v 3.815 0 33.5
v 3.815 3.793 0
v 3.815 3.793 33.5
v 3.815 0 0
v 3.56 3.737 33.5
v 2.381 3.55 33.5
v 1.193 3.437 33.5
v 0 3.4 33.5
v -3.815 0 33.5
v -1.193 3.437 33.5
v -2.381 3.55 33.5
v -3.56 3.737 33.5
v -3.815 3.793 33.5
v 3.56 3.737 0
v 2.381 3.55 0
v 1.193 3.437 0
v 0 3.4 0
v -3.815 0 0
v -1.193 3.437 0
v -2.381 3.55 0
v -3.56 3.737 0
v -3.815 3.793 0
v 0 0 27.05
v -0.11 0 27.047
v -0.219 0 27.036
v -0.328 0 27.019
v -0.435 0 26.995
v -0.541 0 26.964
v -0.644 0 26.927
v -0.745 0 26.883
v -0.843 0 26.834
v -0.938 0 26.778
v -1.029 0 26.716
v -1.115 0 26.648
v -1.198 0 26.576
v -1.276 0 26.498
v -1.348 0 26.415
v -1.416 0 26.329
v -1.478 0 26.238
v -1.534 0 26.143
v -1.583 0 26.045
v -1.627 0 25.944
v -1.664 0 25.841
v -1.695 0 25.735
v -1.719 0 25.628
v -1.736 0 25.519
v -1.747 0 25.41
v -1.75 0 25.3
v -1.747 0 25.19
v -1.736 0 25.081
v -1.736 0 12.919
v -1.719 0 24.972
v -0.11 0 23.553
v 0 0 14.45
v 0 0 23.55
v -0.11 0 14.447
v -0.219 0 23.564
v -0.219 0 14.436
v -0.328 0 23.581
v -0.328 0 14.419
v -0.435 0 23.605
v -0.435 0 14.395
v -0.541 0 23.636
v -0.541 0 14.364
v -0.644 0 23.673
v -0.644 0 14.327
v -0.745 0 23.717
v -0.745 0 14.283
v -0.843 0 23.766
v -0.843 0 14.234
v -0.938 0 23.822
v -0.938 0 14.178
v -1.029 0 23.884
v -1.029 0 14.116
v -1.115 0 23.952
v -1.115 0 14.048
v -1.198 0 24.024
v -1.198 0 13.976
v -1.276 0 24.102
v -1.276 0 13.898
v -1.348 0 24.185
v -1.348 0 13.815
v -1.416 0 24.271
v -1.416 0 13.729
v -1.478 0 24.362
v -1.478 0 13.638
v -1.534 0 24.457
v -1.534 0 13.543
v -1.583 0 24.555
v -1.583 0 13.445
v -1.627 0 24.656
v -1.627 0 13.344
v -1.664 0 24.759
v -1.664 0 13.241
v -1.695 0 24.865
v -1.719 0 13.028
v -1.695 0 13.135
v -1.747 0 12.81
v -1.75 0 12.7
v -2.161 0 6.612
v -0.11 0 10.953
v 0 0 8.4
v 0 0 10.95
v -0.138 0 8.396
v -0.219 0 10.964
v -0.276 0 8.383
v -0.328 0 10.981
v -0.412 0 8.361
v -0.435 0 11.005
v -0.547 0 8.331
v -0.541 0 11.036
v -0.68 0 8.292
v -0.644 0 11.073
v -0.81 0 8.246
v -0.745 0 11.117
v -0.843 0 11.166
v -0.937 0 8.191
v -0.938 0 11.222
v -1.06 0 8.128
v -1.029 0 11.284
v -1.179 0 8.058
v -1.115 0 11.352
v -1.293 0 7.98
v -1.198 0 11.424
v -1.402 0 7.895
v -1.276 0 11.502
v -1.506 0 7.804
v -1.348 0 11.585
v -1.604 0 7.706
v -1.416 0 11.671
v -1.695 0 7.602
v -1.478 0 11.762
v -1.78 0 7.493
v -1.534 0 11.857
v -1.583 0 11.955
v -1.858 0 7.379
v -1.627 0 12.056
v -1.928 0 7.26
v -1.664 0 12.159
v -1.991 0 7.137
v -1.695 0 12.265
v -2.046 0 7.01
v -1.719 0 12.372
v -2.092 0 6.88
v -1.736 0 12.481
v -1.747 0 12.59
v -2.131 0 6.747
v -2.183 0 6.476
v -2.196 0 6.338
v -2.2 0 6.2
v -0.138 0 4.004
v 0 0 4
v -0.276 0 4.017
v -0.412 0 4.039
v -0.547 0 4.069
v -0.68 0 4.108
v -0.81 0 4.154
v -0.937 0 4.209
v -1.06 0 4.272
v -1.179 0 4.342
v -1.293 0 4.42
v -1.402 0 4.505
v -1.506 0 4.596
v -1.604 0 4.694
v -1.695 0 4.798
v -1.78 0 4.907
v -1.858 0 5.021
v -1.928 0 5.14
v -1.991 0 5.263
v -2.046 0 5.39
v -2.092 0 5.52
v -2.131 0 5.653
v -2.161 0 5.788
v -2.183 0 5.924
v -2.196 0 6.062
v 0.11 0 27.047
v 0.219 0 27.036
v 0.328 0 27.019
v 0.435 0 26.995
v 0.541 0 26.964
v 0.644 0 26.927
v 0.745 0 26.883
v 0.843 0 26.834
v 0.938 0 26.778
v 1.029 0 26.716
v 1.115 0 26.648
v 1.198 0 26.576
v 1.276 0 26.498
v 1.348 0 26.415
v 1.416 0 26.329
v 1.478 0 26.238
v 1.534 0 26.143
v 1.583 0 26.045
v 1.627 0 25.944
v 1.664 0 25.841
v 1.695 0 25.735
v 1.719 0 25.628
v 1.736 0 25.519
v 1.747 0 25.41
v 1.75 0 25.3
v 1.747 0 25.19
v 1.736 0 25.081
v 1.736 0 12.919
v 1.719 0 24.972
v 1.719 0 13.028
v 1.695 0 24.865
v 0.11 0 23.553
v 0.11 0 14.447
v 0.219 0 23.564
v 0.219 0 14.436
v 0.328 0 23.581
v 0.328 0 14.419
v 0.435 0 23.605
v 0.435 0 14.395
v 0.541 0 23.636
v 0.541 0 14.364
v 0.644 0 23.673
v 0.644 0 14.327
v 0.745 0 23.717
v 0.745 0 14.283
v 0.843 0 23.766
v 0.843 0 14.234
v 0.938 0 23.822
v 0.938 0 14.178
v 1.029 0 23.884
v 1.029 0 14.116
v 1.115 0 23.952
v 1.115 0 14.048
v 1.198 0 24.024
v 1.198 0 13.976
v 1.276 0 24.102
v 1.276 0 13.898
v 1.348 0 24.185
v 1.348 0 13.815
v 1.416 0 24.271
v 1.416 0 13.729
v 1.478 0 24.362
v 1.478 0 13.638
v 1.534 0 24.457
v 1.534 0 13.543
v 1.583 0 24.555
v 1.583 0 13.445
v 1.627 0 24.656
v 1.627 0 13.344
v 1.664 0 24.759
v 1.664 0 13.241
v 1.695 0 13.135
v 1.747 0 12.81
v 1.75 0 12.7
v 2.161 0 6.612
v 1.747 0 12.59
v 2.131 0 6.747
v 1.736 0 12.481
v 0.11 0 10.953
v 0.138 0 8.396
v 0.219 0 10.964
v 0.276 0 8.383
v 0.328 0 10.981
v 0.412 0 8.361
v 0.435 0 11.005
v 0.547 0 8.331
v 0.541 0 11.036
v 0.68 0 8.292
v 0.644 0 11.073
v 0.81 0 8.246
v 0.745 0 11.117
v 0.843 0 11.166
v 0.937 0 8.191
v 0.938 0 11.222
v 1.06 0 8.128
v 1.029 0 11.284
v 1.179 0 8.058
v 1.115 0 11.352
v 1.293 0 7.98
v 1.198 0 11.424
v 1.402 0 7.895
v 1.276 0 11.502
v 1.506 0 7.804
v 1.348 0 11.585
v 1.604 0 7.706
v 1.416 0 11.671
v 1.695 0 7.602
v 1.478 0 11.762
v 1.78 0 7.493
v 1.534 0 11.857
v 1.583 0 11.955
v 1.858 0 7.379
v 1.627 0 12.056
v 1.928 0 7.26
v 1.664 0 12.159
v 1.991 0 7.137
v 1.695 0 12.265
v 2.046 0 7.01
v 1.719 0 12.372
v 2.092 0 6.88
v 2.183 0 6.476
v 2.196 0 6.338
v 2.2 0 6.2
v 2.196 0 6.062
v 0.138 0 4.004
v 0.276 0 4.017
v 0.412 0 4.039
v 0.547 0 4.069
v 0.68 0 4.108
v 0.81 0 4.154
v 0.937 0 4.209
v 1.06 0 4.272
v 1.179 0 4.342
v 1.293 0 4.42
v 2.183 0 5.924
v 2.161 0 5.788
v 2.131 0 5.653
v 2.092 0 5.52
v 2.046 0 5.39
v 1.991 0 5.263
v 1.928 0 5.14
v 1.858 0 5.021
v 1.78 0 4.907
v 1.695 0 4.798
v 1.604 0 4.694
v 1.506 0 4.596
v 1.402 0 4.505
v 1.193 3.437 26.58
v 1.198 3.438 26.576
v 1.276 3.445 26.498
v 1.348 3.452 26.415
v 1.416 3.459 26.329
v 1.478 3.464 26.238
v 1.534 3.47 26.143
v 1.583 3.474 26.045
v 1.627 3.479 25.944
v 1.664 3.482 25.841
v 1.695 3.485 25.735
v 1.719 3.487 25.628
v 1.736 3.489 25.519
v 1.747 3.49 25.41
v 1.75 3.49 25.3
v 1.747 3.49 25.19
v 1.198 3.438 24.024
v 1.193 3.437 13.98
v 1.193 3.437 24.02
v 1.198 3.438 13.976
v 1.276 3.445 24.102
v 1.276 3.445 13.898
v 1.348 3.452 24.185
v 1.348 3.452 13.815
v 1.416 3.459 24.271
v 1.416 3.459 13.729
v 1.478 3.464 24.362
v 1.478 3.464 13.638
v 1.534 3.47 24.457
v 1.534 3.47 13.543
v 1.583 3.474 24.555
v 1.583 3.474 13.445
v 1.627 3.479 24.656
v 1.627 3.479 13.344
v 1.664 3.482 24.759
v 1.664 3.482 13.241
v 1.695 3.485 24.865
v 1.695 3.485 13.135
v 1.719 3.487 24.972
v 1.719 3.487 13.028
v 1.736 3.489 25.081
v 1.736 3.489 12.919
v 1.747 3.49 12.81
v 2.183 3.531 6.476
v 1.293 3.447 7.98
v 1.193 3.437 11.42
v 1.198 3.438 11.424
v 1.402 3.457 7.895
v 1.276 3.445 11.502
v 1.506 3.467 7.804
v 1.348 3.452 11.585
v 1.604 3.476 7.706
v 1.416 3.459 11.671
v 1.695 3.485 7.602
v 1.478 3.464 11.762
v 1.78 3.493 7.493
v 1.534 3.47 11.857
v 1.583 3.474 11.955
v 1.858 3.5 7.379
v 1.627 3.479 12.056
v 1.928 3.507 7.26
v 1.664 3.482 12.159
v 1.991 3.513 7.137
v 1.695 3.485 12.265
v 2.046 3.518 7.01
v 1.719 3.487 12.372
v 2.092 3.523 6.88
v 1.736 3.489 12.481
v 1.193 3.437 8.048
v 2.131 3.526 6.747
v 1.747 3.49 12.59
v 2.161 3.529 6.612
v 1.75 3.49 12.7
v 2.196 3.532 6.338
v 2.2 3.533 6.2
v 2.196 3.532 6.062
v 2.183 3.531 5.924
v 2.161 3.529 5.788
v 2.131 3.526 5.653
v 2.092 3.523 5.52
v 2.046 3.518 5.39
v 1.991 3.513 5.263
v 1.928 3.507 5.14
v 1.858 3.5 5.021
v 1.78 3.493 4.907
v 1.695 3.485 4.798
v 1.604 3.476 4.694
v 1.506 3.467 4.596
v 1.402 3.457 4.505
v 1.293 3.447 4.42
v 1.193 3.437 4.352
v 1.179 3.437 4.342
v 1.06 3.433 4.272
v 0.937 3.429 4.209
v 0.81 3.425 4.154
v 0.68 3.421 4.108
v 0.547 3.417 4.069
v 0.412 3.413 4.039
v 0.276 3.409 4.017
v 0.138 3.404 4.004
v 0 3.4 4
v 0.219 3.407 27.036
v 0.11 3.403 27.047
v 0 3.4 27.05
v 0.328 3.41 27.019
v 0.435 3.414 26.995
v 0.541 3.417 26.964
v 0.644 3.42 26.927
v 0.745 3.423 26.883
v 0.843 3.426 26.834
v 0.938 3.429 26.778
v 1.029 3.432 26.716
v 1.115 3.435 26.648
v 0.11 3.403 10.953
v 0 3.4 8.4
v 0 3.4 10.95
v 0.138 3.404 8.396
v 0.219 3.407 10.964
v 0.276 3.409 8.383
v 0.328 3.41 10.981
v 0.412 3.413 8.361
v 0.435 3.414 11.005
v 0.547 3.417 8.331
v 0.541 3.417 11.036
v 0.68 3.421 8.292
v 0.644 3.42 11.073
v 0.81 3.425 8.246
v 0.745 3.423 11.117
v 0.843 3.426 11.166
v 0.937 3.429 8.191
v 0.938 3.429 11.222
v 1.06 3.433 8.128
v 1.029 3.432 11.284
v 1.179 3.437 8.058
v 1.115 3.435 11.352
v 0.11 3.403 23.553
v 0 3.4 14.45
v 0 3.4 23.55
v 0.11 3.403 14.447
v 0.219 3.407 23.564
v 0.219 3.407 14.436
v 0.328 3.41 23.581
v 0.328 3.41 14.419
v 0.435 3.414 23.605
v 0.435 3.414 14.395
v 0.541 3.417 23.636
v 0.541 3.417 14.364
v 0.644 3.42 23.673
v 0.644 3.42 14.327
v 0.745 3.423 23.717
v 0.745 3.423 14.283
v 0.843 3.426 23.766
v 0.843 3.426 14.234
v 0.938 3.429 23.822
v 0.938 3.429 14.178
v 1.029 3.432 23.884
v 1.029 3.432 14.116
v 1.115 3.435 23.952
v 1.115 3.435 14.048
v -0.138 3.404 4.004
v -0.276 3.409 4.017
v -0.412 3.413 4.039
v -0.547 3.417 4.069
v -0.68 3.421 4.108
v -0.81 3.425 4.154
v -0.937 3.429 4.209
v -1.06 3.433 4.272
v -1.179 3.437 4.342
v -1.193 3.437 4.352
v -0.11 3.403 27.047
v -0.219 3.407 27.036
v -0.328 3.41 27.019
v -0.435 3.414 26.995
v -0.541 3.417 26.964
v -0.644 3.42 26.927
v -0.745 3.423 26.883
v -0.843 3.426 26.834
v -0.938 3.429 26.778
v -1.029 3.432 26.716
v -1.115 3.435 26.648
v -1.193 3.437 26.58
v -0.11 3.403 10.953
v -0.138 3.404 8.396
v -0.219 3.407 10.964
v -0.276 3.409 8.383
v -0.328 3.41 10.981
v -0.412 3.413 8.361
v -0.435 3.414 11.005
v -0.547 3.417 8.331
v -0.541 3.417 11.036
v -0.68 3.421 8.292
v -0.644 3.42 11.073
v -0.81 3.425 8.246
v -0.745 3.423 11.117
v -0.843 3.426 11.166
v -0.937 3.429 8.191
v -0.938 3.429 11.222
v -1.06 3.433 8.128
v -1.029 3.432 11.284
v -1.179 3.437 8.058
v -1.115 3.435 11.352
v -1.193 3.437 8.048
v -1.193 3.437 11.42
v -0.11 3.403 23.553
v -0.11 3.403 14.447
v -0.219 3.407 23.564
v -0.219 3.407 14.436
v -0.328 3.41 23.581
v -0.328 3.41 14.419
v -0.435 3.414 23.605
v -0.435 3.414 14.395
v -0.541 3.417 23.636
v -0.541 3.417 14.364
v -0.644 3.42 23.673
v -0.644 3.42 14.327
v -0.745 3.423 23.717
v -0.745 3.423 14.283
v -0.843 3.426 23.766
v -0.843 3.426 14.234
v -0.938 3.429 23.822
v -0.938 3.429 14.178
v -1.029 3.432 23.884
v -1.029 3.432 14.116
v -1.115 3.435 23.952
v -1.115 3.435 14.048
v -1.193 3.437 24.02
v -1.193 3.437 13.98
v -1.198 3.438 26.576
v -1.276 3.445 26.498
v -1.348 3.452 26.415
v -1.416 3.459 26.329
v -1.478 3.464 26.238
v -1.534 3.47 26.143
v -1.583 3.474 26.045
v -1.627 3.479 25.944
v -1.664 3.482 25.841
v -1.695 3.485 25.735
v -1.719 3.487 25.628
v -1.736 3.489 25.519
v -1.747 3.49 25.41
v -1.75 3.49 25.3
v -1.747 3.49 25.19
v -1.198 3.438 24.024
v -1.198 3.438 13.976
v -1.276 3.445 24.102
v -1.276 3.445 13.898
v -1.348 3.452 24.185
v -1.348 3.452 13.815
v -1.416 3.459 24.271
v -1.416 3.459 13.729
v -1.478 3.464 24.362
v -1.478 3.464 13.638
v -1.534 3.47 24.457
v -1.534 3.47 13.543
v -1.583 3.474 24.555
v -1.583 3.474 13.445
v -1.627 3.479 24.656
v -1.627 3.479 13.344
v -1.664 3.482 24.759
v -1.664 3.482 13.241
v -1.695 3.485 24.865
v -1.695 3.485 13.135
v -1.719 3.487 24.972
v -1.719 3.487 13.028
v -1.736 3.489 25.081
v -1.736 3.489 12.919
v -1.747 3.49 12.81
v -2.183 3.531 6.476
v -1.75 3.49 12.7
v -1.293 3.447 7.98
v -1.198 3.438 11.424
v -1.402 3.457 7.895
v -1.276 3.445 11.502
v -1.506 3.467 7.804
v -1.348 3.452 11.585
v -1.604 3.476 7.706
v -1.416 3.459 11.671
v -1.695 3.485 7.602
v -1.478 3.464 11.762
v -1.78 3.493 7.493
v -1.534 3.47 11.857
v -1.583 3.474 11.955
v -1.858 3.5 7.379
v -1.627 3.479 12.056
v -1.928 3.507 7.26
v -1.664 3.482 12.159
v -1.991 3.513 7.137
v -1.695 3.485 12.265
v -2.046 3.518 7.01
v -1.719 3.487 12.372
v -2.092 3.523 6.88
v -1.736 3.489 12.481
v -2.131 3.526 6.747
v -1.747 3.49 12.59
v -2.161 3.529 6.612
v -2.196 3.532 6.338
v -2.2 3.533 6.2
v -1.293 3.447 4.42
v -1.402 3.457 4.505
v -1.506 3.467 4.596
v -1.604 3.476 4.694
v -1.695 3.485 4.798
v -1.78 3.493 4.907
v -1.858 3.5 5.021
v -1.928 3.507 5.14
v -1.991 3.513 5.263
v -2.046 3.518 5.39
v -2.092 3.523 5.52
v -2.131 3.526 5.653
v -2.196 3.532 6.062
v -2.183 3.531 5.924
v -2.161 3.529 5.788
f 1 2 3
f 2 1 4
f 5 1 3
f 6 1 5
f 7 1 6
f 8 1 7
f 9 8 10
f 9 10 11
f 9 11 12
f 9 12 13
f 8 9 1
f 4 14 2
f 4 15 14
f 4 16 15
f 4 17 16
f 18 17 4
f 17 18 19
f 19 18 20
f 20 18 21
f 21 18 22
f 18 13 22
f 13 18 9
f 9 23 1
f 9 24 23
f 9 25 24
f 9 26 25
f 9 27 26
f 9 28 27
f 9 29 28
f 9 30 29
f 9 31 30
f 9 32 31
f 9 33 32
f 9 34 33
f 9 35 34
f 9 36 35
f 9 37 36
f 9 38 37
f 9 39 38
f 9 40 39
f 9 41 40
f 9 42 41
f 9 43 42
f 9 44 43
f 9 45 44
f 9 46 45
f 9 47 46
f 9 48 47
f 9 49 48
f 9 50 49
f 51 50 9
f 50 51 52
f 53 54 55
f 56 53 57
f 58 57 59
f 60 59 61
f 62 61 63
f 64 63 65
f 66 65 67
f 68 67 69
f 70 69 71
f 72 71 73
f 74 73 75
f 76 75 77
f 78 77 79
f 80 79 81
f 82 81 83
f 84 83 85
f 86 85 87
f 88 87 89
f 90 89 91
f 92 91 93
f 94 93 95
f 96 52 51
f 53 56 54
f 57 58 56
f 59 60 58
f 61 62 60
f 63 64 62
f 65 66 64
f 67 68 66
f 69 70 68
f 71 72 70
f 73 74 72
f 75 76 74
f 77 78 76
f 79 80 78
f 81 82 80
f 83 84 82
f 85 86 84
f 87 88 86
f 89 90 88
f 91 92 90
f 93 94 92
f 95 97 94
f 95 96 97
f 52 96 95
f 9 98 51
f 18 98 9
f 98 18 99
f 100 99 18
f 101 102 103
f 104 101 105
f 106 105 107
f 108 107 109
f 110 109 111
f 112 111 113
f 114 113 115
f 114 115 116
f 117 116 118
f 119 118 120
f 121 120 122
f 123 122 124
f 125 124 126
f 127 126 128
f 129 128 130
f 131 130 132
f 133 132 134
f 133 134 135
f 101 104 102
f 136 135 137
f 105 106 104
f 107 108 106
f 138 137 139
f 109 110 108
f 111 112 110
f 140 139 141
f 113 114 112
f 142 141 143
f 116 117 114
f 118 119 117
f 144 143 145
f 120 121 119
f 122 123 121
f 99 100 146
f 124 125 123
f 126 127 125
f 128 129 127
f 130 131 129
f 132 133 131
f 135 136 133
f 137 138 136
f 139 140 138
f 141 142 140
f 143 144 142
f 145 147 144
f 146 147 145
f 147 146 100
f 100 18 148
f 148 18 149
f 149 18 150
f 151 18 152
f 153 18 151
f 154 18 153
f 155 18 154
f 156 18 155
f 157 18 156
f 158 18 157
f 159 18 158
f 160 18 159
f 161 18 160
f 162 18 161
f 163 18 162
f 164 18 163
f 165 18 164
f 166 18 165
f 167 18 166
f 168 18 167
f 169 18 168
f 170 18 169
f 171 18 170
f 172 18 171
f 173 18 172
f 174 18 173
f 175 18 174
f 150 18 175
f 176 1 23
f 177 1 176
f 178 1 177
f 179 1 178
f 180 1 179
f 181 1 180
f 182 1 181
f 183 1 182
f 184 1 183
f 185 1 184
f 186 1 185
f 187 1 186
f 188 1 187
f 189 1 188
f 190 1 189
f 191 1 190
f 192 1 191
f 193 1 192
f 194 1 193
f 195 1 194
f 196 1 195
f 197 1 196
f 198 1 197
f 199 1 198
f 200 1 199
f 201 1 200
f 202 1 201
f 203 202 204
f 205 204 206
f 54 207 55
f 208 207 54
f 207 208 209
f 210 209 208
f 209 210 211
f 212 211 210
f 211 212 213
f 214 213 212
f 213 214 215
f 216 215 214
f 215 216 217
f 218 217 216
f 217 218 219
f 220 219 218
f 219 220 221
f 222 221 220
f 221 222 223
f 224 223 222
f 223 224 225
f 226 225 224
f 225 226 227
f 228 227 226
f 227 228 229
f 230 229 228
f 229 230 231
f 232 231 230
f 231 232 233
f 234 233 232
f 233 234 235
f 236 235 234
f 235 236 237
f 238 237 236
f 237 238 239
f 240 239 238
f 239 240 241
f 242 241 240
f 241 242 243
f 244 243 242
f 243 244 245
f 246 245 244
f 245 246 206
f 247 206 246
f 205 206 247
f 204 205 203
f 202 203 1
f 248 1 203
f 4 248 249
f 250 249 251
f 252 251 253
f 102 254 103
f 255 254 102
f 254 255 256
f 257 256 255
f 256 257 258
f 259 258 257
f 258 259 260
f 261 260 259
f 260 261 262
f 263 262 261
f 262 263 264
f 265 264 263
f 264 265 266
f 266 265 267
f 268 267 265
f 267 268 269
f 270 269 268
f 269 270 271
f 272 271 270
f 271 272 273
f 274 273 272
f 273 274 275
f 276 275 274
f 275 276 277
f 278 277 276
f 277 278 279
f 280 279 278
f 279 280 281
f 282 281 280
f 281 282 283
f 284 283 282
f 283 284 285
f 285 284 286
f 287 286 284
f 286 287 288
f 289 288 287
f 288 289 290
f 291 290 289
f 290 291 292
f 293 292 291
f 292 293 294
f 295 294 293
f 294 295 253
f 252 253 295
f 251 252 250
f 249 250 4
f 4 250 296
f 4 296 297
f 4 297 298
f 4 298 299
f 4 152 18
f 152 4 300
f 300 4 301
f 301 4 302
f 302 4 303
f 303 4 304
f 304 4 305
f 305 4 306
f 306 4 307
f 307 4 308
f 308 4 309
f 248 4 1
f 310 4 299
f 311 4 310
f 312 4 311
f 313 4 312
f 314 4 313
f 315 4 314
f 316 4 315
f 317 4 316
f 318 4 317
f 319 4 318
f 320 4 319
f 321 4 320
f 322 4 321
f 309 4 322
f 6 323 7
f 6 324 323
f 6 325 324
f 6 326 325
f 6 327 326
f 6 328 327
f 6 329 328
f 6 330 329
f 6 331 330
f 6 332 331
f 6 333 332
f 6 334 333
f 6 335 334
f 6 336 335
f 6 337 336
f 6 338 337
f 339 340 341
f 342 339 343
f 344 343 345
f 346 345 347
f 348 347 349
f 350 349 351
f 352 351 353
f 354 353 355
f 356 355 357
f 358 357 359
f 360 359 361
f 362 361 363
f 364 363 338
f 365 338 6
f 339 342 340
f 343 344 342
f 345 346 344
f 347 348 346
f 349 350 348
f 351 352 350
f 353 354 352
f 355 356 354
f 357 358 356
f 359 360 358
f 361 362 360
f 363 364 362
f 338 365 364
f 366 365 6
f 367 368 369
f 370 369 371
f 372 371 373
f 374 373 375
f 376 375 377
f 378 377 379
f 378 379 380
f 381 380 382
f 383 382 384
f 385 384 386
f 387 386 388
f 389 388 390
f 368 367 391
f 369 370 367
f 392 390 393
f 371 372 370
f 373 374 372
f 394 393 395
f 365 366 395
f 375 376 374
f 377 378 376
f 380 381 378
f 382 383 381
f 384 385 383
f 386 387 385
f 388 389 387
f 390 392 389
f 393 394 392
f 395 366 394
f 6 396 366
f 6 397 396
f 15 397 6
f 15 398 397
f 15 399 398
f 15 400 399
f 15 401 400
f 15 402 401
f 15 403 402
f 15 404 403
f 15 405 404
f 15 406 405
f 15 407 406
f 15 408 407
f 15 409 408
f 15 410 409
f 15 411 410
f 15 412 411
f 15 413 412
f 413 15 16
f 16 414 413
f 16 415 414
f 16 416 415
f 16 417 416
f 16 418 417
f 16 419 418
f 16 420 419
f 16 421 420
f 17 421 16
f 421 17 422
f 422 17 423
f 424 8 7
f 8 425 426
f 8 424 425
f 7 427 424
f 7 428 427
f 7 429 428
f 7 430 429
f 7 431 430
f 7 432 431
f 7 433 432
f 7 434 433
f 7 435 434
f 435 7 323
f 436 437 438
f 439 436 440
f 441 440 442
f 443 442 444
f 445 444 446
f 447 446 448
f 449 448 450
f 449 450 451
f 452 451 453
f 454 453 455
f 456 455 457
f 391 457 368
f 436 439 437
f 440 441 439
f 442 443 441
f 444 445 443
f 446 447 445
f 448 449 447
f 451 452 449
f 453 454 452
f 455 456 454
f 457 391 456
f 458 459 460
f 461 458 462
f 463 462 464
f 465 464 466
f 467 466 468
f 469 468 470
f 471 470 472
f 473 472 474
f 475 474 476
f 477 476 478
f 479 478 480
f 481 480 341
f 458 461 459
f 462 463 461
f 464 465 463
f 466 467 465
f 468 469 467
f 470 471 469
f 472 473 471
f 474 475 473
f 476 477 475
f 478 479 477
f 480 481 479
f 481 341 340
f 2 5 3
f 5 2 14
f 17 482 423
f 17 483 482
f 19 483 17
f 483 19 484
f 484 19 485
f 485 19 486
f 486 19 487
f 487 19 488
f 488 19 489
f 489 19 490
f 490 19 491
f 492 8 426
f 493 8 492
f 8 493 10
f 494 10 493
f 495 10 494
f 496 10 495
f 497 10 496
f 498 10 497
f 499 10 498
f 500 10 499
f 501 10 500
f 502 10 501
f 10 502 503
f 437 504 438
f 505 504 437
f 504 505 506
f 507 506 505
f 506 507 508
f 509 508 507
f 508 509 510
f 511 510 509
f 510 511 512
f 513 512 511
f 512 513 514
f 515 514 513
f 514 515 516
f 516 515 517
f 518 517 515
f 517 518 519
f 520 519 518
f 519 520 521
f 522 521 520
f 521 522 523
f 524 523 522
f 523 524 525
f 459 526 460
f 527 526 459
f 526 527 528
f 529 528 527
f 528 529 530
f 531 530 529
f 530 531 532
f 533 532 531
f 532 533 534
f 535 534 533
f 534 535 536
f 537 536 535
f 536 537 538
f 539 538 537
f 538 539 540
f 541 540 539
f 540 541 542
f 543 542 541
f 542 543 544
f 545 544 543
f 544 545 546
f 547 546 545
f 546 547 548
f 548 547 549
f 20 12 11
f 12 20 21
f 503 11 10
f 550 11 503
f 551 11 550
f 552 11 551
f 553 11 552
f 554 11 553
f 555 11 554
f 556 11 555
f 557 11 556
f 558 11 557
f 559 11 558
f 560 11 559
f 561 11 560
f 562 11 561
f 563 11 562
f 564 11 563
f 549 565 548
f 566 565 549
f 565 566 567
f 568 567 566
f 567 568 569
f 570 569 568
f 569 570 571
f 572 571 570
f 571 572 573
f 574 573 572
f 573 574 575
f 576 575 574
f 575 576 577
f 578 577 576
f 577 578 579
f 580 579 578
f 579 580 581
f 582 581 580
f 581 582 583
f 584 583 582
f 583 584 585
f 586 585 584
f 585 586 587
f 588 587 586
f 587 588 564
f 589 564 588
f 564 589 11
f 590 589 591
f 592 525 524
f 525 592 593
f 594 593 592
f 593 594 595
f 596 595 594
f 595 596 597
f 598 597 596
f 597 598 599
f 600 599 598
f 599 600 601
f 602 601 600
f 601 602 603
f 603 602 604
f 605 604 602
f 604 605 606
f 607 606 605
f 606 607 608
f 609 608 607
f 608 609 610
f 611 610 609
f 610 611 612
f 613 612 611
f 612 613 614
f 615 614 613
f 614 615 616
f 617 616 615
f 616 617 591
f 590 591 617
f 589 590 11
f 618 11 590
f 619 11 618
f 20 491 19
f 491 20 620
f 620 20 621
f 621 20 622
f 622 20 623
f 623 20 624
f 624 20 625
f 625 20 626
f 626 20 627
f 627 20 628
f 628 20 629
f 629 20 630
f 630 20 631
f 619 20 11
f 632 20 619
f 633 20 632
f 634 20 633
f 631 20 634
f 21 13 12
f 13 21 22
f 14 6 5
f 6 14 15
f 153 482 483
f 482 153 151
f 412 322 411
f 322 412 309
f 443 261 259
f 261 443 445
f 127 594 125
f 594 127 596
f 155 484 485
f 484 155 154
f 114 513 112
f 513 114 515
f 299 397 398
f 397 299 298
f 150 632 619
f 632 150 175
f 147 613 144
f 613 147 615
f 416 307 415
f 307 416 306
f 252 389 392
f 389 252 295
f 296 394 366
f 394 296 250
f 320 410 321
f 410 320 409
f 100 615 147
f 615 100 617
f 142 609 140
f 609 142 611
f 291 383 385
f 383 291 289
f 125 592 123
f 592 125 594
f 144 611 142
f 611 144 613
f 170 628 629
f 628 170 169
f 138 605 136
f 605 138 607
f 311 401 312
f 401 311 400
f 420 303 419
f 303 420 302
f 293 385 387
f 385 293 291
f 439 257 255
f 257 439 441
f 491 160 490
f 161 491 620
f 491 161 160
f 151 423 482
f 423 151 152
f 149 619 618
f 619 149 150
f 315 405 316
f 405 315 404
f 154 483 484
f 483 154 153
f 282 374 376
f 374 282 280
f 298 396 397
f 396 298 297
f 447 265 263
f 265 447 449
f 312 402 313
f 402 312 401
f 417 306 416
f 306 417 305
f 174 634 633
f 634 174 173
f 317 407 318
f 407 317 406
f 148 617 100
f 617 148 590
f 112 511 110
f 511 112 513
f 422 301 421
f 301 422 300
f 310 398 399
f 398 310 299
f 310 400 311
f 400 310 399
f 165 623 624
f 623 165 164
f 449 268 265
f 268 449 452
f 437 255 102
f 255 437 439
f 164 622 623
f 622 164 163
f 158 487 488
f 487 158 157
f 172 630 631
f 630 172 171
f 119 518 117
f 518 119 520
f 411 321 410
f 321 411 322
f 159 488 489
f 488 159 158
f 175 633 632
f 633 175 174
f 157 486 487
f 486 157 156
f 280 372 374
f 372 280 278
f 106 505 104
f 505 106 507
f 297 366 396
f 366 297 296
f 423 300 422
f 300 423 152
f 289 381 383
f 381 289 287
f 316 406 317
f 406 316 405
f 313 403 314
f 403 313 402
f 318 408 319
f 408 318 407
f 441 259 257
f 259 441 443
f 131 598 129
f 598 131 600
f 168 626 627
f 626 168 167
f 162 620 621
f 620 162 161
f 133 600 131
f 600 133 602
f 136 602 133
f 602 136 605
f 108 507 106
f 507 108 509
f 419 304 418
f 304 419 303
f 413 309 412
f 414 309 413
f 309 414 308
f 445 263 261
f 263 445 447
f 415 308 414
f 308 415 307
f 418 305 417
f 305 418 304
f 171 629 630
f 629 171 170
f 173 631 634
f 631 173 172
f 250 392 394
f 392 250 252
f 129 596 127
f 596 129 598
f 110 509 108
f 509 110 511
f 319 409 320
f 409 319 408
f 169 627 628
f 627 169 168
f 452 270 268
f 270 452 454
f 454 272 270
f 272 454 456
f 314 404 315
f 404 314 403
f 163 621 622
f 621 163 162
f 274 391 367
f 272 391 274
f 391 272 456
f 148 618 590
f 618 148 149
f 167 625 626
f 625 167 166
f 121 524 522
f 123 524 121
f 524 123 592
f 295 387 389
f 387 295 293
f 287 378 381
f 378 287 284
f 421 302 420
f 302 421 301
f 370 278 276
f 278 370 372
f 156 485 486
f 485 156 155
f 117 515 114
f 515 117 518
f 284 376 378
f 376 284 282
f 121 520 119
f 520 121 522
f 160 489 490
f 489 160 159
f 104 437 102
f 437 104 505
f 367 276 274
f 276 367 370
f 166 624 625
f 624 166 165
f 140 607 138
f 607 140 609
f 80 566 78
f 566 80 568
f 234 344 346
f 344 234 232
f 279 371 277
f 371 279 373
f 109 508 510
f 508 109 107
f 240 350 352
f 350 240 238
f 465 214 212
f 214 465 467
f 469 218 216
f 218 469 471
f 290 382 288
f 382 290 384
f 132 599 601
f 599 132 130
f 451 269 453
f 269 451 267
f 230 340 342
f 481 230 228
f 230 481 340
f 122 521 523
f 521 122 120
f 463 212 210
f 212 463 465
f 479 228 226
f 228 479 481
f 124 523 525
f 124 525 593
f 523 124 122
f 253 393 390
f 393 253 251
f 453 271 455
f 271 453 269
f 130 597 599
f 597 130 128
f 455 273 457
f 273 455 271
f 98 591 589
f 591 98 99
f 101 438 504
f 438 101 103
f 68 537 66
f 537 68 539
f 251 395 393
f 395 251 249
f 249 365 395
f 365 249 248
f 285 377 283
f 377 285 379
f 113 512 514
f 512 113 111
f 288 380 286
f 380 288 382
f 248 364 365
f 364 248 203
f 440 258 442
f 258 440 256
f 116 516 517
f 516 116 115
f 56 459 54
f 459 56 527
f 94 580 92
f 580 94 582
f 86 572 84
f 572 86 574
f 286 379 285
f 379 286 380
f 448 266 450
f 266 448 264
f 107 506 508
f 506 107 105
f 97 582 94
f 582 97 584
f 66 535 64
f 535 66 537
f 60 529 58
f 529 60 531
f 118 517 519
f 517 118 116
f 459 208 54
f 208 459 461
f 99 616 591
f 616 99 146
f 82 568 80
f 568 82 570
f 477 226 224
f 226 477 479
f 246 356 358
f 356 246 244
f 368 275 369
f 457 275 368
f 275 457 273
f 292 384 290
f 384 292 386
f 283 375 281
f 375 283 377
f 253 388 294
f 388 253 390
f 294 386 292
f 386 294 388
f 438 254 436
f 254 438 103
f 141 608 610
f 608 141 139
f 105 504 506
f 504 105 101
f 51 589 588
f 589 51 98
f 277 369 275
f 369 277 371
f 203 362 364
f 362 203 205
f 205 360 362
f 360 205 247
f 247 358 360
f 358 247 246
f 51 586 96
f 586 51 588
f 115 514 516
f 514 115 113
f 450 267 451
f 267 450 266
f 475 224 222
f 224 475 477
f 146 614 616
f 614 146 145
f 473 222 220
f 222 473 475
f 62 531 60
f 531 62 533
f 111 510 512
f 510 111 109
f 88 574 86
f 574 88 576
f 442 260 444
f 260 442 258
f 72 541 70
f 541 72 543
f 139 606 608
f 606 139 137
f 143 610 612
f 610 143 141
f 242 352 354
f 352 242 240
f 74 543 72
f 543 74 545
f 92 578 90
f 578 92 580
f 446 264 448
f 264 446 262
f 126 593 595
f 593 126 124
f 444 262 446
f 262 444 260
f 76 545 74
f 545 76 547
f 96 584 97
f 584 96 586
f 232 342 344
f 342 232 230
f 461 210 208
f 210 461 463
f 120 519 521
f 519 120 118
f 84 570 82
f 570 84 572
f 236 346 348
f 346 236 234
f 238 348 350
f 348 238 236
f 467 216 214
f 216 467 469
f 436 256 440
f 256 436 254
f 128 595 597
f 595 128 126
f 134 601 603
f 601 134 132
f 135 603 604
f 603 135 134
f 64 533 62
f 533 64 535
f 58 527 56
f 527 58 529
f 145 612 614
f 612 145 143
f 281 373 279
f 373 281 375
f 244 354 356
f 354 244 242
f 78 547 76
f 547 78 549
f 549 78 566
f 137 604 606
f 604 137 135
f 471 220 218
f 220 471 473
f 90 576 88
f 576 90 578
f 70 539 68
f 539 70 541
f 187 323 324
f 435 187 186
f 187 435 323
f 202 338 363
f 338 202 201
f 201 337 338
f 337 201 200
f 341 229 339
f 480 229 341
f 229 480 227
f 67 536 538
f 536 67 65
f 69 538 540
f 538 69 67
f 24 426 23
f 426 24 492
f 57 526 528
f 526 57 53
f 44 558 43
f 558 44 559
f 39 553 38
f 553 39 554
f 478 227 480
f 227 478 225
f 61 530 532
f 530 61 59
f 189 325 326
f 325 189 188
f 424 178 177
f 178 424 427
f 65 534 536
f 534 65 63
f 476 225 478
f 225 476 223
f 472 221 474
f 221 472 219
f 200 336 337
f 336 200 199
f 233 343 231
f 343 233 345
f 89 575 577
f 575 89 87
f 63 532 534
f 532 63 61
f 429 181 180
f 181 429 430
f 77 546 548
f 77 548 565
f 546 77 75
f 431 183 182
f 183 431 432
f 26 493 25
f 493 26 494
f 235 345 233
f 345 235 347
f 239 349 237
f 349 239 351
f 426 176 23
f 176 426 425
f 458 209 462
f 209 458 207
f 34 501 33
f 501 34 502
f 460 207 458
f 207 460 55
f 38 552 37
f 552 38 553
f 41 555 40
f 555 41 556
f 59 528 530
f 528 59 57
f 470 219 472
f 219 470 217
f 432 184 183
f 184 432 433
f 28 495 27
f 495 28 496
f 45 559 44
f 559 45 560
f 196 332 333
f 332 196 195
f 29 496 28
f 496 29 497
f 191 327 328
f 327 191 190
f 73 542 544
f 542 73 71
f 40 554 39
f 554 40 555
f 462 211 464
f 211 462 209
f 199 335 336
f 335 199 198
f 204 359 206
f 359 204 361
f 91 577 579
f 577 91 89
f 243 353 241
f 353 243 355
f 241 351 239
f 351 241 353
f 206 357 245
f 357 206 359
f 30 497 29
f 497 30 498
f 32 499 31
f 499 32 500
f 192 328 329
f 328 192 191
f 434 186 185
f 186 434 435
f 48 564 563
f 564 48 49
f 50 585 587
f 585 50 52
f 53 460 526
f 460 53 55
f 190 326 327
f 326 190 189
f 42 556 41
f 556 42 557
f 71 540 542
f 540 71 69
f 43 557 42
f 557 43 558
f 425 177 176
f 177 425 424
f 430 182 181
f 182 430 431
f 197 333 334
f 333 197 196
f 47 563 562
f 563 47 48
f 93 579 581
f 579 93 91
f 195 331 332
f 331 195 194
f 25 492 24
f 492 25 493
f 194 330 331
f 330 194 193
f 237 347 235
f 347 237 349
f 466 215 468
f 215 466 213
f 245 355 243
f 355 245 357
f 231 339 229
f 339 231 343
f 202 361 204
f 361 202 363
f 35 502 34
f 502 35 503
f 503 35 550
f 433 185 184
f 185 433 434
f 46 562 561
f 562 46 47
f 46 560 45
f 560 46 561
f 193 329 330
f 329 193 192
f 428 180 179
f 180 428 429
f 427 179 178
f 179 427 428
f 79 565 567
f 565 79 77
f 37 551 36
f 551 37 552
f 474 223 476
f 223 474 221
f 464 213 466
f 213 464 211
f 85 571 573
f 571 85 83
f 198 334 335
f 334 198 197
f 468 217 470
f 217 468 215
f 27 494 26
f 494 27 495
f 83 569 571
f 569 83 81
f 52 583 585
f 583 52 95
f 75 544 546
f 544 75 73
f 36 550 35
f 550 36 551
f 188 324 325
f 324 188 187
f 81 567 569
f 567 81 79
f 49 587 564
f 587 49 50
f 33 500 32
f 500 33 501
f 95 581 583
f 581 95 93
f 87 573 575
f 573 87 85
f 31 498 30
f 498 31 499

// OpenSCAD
CX = 7.63;
CZ = 33.5;
DY = 3.4;
DIAMETER = 38.0;

$fn = 100;

difference() {
    translate([-CX/2, 0, 0]) cube(size=[CX, 10, CZ]);
    translate([0, DY + DIAMETER/2, 0]) cylinder(h=100, d=DIAMETER);

    // 6.2, d=4.2
    translate([0, 0, 6.2]) rotate([-90, 0, 0]) cylinder(h=10, d=4.4);
    // 12.7, d=3.2
    translate([0, 0, 12.7]) rotate([-90, 0, 0]) cylinder(h=10, d=3.5);
    // 25.3, d=3.2
    translate([0, 0, 25.3]) rotate([-90, 0, 0]) cylinder(h=10, d=3.5);
}
